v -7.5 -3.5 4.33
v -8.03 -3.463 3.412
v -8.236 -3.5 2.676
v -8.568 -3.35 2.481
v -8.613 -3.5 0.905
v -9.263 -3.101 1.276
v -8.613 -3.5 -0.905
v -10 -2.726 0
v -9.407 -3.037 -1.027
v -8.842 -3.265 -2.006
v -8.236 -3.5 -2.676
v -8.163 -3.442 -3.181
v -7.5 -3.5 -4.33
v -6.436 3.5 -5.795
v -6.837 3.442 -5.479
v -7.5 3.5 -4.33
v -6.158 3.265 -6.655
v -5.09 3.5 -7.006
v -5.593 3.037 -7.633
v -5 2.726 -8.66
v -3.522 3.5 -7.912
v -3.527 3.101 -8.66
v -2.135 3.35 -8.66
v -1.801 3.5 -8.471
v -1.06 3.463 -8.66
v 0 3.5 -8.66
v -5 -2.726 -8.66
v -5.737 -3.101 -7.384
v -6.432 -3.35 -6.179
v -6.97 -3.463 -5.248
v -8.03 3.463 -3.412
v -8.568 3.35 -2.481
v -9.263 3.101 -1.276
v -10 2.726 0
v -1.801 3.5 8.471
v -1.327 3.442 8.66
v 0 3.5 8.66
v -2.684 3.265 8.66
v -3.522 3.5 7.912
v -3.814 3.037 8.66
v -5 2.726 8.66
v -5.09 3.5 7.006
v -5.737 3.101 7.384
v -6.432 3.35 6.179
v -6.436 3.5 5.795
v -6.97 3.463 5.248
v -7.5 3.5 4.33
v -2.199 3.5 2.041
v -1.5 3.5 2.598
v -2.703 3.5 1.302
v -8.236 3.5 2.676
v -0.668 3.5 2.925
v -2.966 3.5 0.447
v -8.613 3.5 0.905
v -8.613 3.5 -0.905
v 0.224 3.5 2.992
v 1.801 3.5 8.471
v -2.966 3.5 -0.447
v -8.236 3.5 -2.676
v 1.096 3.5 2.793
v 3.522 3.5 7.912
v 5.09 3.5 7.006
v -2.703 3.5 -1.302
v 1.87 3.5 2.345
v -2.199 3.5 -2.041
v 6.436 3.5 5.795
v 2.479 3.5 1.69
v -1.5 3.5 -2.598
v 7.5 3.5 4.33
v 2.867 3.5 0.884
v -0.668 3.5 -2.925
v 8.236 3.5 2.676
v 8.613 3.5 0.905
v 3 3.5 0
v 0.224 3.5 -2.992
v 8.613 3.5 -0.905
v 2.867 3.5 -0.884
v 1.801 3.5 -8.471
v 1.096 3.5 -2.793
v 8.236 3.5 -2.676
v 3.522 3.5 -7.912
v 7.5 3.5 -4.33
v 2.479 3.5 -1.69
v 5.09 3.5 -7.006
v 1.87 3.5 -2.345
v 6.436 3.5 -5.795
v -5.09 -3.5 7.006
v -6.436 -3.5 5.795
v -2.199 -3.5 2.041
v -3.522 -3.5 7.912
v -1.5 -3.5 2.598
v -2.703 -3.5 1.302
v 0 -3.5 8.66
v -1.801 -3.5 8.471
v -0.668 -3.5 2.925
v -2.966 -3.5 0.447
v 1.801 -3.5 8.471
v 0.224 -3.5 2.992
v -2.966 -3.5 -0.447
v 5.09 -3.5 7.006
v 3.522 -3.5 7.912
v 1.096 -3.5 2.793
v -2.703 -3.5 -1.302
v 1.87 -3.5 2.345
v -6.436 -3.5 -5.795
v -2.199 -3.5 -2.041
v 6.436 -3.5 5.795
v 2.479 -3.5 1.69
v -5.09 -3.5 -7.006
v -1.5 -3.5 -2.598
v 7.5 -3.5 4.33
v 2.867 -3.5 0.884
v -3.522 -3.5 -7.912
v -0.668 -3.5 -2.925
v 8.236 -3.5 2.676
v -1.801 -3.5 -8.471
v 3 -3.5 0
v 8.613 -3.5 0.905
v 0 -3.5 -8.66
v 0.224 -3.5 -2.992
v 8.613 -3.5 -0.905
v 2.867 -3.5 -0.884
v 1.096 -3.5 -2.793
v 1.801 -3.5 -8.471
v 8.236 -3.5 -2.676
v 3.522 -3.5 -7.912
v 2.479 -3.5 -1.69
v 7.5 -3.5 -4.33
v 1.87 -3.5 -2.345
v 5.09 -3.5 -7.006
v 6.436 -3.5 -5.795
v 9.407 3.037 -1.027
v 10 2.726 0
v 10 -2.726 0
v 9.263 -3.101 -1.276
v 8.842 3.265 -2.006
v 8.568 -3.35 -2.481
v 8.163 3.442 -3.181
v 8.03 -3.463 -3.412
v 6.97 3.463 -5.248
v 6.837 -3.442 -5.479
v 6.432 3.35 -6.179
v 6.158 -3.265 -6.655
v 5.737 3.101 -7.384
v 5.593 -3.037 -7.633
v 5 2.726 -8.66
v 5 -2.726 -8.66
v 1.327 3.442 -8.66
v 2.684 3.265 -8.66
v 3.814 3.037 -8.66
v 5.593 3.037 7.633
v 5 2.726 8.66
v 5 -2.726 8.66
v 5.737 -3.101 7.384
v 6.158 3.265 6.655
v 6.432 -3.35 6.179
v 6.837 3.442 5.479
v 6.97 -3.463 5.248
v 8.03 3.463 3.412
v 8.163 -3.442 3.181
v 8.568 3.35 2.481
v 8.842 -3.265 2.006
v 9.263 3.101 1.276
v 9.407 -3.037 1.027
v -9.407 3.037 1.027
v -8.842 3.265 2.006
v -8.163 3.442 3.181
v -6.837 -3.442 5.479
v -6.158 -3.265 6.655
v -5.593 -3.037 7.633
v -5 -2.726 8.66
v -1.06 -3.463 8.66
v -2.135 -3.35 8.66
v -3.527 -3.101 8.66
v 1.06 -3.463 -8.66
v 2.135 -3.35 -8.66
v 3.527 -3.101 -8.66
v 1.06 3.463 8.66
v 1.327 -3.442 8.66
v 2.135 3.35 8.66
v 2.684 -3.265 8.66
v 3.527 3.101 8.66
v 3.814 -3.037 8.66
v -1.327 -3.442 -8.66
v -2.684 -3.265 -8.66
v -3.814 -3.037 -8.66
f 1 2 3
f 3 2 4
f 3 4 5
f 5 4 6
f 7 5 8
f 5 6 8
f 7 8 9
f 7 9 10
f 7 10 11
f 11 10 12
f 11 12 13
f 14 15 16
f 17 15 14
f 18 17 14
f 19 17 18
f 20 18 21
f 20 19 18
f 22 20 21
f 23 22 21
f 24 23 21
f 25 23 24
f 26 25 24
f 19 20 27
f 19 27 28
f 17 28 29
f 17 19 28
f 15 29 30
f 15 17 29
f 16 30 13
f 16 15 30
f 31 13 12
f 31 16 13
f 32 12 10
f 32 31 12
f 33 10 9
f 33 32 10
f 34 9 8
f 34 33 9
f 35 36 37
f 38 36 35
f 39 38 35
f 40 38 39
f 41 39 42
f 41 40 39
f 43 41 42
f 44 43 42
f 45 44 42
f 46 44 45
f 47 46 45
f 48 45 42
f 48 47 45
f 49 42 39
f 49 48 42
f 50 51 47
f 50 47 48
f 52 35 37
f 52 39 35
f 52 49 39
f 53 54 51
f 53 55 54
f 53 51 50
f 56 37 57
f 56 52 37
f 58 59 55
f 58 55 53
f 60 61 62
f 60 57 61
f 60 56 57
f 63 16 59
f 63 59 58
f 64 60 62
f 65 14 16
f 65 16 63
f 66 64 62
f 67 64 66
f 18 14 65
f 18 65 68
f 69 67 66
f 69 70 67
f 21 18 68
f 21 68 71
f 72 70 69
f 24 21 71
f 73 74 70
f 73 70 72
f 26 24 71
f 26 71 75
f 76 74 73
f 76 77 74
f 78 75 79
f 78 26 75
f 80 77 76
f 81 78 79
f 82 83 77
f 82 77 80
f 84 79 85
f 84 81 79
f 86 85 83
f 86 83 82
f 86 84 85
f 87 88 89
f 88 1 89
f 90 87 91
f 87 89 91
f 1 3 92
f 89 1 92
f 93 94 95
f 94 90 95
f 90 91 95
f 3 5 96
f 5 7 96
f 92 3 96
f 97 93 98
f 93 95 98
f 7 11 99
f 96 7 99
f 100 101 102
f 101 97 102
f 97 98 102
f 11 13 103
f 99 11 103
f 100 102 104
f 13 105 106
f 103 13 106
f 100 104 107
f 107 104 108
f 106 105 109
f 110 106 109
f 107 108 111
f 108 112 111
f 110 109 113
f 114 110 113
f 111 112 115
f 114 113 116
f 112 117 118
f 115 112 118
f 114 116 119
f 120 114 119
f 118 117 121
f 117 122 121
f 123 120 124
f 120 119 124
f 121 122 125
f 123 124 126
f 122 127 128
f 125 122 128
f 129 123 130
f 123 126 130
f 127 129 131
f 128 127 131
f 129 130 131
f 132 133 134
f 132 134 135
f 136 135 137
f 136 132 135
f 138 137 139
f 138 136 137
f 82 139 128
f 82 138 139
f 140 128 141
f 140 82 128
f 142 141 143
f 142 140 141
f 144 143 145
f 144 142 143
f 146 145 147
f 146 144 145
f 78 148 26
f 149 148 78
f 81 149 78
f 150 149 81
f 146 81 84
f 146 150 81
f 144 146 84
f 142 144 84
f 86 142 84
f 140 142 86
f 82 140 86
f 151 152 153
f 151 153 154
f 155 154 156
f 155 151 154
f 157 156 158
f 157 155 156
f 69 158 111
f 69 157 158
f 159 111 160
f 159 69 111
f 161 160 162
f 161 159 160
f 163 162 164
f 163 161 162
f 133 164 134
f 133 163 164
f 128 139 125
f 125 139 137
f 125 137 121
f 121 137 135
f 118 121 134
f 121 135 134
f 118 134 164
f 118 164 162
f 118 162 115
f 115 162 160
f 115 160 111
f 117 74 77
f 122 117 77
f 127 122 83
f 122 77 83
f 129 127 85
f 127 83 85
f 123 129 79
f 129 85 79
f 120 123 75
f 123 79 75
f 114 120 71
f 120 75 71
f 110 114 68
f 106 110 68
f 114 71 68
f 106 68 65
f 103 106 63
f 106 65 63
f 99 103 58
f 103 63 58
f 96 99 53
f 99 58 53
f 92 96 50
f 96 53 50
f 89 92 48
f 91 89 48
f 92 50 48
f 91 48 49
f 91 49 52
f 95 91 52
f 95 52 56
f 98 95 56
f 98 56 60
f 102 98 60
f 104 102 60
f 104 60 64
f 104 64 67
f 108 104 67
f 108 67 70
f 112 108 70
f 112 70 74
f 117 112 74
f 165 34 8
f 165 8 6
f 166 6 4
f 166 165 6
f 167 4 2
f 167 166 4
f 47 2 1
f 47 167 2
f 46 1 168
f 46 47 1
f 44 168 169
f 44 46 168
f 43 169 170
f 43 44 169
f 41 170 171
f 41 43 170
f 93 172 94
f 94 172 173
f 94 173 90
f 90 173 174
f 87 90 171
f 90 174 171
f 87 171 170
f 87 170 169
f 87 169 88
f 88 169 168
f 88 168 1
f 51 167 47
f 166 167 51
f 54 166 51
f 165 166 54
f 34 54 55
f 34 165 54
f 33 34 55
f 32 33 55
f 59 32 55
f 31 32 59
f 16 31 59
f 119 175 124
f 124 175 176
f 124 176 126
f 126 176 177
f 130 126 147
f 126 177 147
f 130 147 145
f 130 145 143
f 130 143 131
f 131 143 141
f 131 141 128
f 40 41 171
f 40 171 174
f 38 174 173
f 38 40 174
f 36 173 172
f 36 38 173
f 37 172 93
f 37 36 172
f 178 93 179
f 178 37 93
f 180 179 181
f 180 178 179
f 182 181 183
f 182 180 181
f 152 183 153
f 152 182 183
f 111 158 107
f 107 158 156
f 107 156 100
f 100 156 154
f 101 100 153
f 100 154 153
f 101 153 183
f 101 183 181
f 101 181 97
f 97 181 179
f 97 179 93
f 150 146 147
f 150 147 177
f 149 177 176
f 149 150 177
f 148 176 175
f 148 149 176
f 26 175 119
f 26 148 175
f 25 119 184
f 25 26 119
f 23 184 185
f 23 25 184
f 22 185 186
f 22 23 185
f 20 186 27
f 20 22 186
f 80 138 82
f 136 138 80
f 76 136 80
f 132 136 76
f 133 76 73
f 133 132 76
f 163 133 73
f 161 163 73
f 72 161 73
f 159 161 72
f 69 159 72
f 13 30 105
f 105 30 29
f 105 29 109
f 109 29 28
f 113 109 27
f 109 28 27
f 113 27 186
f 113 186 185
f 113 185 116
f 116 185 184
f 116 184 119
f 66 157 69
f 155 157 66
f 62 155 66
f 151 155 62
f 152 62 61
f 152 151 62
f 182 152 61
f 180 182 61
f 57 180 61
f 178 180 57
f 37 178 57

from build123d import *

# Parameters (mm, degrees)
BOSS_EXTRUDE1_DEPTH = 3.5
SKETCH2_OUTSIDE_W   = 51.722
SKETCH2_OUTSIDE_H   = 49.042
SKETCH2_OUTSIDE_R   = 8.660254038
CUT_EXTRUDE1_DEPTH  = 7
CUT_EXTRUDE1_TAPER  = 60
SKETCH3_R           = 3
CUT_EXTRUDE2_DEPTH  = 8


with BuildPart() as part:
    # Sketch1 → Boss-Extrude1 (new body, symmetric)
    with BuildSketch(Plane(origin=(0, 0, 0), x_dir=(1, 0, 0), z_dir=(0, 1, 0))):
        Polygon((-10, 0), (-5, -8.660254038), (5, -8.660254038), (10, 0), (5, 8.660254038), (-5, 8.660254038), align=None)
    extrude(amount=BOSS_EXTRUDE1_DEPTH, both=True)

    # Sketch2 outside → Cut-Extrude1 (cut)
    with BuildSketch(Plane(origin=(0, 3.5, 0), x_dir=(1, 0, 0), z_dir=(0, 1, 0))):
        Rectangle(SKETCH2_OUTSIDE_W, SKETCH2_OUTSIDE_H)
        Circle(SKETCH2_OUTSIDE_R, mode=Mode.SUBTRACT)
    cut_extrude1 = extrude(amount=-CUT_EXTRUDE1_DEPTH, taper=CUT_EXTRUDE1_TAPER, mode=Mode.SUBTRACT)

    # Mirror1: Cut-Extrude1 across plane
    add(cut_extrude1.mirror(Plane.ZX), mode=Mode.SUBTRACT)

    # Sketch3 → Cut-Extrude2 (cut, through all)
    with BuildSketch(Plane(origin=(0, 3.5, 0), x_dir=(1, 0, 0), z_dir=(0, 1, 0))):
        Circle(SKETCH3_R)
    extrude(amount=-CUT_EXTRUDE2_DEPTH, mode=Mode.SUBTRACT)


solid = part.part
